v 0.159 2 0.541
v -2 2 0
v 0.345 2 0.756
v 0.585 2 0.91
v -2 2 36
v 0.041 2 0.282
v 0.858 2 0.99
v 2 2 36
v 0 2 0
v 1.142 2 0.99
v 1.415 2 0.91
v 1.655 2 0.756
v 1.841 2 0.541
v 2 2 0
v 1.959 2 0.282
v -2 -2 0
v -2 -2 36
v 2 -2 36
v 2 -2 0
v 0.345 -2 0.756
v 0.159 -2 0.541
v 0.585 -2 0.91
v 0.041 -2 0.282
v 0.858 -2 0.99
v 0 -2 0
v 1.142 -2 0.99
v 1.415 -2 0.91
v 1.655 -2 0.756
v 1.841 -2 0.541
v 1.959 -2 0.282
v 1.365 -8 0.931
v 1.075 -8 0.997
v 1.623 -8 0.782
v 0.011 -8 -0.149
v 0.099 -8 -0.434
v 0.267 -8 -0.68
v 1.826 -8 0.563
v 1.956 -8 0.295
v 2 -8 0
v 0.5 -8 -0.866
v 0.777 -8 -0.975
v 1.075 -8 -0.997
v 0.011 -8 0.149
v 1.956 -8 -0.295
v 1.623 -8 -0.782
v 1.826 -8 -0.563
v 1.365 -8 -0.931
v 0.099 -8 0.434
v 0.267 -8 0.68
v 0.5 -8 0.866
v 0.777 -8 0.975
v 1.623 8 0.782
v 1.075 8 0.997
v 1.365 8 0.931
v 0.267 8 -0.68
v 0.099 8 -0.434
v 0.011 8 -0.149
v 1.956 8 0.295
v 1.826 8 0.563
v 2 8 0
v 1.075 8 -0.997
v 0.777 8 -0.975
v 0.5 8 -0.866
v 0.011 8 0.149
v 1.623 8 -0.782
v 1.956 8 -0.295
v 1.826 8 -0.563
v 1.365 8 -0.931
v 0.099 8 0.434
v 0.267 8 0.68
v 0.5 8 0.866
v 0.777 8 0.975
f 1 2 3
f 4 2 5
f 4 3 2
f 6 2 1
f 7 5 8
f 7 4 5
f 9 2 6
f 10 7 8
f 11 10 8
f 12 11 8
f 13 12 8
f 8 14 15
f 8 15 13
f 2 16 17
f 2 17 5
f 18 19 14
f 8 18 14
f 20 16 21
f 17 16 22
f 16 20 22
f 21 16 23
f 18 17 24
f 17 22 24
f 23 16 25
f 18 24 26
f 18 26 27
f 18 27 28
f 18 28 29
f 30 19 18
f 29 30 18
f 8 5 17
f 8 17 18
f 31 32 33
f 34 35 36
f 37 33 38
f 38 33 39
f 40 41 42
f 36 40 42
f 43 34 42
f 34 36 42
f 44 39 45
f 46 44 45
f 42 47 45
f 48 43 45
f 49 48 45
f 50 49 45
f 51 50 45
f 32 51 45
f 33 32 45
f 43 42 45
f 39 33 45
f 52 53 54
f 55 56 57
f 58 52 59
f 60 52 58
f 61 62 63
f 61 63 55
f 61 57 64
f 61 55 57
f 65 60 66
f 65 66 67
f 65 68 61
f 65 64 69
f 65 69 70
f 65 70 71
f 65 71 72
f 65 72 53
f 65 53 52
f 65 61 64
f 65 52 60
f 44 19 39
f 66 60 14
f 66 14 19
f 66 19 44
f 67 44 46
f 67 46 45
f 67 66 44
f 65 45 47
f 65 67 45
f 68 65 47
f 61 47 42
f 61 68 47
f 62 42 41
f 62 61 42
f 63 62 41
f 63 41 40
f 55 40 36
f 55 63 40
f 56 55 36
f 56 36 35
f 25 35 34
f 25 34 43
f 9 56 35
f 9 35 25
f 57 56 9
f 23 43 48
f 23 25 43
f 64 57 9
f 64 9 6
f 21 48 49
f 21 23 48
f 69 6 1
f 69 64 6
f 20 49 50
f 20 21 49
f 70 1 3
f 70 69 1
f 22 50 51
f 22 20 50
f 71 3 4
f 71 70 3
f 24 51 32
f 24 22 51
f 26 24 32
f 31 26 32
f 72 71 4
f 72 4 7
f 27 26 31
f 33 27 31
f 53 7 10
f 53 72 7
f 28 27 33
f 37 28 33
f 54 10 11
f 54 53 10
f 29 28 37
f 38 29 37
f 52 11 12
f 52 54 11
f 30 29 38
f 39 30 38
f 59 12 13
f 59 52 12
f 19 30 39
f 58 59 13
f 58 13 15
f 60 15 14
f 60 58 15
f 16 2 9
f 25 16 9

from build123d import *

# Parameters (mm, degrees)
SKETCH_1_W      = 4
SKETCH_1_H      = 4
EXTRUDE_1_DEPTH = 36
SKETCH_3_R      = 1
EXTRUDE_2_DEPTH = 8


with BuildPart() as part:
    # 草图1 → 凸台-拉伸1 (new body)
    with BuildSketch(Plane.XY):
        Rectangle(SKETCH_1_W, SKETCH_1_H)
    extrude(amount=EXTRUDE_1_DEPTH)

    # 草图3 → 凸台-拉伸2 (add, symmetric)
    with BuildSketch(Plane(origin=(0, 0, 0), x_dir=(1, 0, 0), z_dir=(0, 1, 0))):
        with Locations((1, 0)):
            Circle(SKETCH_3_R)
    extrude(amount=EXTRUDE_2_DEPTH, both=True)


solid = part.part
